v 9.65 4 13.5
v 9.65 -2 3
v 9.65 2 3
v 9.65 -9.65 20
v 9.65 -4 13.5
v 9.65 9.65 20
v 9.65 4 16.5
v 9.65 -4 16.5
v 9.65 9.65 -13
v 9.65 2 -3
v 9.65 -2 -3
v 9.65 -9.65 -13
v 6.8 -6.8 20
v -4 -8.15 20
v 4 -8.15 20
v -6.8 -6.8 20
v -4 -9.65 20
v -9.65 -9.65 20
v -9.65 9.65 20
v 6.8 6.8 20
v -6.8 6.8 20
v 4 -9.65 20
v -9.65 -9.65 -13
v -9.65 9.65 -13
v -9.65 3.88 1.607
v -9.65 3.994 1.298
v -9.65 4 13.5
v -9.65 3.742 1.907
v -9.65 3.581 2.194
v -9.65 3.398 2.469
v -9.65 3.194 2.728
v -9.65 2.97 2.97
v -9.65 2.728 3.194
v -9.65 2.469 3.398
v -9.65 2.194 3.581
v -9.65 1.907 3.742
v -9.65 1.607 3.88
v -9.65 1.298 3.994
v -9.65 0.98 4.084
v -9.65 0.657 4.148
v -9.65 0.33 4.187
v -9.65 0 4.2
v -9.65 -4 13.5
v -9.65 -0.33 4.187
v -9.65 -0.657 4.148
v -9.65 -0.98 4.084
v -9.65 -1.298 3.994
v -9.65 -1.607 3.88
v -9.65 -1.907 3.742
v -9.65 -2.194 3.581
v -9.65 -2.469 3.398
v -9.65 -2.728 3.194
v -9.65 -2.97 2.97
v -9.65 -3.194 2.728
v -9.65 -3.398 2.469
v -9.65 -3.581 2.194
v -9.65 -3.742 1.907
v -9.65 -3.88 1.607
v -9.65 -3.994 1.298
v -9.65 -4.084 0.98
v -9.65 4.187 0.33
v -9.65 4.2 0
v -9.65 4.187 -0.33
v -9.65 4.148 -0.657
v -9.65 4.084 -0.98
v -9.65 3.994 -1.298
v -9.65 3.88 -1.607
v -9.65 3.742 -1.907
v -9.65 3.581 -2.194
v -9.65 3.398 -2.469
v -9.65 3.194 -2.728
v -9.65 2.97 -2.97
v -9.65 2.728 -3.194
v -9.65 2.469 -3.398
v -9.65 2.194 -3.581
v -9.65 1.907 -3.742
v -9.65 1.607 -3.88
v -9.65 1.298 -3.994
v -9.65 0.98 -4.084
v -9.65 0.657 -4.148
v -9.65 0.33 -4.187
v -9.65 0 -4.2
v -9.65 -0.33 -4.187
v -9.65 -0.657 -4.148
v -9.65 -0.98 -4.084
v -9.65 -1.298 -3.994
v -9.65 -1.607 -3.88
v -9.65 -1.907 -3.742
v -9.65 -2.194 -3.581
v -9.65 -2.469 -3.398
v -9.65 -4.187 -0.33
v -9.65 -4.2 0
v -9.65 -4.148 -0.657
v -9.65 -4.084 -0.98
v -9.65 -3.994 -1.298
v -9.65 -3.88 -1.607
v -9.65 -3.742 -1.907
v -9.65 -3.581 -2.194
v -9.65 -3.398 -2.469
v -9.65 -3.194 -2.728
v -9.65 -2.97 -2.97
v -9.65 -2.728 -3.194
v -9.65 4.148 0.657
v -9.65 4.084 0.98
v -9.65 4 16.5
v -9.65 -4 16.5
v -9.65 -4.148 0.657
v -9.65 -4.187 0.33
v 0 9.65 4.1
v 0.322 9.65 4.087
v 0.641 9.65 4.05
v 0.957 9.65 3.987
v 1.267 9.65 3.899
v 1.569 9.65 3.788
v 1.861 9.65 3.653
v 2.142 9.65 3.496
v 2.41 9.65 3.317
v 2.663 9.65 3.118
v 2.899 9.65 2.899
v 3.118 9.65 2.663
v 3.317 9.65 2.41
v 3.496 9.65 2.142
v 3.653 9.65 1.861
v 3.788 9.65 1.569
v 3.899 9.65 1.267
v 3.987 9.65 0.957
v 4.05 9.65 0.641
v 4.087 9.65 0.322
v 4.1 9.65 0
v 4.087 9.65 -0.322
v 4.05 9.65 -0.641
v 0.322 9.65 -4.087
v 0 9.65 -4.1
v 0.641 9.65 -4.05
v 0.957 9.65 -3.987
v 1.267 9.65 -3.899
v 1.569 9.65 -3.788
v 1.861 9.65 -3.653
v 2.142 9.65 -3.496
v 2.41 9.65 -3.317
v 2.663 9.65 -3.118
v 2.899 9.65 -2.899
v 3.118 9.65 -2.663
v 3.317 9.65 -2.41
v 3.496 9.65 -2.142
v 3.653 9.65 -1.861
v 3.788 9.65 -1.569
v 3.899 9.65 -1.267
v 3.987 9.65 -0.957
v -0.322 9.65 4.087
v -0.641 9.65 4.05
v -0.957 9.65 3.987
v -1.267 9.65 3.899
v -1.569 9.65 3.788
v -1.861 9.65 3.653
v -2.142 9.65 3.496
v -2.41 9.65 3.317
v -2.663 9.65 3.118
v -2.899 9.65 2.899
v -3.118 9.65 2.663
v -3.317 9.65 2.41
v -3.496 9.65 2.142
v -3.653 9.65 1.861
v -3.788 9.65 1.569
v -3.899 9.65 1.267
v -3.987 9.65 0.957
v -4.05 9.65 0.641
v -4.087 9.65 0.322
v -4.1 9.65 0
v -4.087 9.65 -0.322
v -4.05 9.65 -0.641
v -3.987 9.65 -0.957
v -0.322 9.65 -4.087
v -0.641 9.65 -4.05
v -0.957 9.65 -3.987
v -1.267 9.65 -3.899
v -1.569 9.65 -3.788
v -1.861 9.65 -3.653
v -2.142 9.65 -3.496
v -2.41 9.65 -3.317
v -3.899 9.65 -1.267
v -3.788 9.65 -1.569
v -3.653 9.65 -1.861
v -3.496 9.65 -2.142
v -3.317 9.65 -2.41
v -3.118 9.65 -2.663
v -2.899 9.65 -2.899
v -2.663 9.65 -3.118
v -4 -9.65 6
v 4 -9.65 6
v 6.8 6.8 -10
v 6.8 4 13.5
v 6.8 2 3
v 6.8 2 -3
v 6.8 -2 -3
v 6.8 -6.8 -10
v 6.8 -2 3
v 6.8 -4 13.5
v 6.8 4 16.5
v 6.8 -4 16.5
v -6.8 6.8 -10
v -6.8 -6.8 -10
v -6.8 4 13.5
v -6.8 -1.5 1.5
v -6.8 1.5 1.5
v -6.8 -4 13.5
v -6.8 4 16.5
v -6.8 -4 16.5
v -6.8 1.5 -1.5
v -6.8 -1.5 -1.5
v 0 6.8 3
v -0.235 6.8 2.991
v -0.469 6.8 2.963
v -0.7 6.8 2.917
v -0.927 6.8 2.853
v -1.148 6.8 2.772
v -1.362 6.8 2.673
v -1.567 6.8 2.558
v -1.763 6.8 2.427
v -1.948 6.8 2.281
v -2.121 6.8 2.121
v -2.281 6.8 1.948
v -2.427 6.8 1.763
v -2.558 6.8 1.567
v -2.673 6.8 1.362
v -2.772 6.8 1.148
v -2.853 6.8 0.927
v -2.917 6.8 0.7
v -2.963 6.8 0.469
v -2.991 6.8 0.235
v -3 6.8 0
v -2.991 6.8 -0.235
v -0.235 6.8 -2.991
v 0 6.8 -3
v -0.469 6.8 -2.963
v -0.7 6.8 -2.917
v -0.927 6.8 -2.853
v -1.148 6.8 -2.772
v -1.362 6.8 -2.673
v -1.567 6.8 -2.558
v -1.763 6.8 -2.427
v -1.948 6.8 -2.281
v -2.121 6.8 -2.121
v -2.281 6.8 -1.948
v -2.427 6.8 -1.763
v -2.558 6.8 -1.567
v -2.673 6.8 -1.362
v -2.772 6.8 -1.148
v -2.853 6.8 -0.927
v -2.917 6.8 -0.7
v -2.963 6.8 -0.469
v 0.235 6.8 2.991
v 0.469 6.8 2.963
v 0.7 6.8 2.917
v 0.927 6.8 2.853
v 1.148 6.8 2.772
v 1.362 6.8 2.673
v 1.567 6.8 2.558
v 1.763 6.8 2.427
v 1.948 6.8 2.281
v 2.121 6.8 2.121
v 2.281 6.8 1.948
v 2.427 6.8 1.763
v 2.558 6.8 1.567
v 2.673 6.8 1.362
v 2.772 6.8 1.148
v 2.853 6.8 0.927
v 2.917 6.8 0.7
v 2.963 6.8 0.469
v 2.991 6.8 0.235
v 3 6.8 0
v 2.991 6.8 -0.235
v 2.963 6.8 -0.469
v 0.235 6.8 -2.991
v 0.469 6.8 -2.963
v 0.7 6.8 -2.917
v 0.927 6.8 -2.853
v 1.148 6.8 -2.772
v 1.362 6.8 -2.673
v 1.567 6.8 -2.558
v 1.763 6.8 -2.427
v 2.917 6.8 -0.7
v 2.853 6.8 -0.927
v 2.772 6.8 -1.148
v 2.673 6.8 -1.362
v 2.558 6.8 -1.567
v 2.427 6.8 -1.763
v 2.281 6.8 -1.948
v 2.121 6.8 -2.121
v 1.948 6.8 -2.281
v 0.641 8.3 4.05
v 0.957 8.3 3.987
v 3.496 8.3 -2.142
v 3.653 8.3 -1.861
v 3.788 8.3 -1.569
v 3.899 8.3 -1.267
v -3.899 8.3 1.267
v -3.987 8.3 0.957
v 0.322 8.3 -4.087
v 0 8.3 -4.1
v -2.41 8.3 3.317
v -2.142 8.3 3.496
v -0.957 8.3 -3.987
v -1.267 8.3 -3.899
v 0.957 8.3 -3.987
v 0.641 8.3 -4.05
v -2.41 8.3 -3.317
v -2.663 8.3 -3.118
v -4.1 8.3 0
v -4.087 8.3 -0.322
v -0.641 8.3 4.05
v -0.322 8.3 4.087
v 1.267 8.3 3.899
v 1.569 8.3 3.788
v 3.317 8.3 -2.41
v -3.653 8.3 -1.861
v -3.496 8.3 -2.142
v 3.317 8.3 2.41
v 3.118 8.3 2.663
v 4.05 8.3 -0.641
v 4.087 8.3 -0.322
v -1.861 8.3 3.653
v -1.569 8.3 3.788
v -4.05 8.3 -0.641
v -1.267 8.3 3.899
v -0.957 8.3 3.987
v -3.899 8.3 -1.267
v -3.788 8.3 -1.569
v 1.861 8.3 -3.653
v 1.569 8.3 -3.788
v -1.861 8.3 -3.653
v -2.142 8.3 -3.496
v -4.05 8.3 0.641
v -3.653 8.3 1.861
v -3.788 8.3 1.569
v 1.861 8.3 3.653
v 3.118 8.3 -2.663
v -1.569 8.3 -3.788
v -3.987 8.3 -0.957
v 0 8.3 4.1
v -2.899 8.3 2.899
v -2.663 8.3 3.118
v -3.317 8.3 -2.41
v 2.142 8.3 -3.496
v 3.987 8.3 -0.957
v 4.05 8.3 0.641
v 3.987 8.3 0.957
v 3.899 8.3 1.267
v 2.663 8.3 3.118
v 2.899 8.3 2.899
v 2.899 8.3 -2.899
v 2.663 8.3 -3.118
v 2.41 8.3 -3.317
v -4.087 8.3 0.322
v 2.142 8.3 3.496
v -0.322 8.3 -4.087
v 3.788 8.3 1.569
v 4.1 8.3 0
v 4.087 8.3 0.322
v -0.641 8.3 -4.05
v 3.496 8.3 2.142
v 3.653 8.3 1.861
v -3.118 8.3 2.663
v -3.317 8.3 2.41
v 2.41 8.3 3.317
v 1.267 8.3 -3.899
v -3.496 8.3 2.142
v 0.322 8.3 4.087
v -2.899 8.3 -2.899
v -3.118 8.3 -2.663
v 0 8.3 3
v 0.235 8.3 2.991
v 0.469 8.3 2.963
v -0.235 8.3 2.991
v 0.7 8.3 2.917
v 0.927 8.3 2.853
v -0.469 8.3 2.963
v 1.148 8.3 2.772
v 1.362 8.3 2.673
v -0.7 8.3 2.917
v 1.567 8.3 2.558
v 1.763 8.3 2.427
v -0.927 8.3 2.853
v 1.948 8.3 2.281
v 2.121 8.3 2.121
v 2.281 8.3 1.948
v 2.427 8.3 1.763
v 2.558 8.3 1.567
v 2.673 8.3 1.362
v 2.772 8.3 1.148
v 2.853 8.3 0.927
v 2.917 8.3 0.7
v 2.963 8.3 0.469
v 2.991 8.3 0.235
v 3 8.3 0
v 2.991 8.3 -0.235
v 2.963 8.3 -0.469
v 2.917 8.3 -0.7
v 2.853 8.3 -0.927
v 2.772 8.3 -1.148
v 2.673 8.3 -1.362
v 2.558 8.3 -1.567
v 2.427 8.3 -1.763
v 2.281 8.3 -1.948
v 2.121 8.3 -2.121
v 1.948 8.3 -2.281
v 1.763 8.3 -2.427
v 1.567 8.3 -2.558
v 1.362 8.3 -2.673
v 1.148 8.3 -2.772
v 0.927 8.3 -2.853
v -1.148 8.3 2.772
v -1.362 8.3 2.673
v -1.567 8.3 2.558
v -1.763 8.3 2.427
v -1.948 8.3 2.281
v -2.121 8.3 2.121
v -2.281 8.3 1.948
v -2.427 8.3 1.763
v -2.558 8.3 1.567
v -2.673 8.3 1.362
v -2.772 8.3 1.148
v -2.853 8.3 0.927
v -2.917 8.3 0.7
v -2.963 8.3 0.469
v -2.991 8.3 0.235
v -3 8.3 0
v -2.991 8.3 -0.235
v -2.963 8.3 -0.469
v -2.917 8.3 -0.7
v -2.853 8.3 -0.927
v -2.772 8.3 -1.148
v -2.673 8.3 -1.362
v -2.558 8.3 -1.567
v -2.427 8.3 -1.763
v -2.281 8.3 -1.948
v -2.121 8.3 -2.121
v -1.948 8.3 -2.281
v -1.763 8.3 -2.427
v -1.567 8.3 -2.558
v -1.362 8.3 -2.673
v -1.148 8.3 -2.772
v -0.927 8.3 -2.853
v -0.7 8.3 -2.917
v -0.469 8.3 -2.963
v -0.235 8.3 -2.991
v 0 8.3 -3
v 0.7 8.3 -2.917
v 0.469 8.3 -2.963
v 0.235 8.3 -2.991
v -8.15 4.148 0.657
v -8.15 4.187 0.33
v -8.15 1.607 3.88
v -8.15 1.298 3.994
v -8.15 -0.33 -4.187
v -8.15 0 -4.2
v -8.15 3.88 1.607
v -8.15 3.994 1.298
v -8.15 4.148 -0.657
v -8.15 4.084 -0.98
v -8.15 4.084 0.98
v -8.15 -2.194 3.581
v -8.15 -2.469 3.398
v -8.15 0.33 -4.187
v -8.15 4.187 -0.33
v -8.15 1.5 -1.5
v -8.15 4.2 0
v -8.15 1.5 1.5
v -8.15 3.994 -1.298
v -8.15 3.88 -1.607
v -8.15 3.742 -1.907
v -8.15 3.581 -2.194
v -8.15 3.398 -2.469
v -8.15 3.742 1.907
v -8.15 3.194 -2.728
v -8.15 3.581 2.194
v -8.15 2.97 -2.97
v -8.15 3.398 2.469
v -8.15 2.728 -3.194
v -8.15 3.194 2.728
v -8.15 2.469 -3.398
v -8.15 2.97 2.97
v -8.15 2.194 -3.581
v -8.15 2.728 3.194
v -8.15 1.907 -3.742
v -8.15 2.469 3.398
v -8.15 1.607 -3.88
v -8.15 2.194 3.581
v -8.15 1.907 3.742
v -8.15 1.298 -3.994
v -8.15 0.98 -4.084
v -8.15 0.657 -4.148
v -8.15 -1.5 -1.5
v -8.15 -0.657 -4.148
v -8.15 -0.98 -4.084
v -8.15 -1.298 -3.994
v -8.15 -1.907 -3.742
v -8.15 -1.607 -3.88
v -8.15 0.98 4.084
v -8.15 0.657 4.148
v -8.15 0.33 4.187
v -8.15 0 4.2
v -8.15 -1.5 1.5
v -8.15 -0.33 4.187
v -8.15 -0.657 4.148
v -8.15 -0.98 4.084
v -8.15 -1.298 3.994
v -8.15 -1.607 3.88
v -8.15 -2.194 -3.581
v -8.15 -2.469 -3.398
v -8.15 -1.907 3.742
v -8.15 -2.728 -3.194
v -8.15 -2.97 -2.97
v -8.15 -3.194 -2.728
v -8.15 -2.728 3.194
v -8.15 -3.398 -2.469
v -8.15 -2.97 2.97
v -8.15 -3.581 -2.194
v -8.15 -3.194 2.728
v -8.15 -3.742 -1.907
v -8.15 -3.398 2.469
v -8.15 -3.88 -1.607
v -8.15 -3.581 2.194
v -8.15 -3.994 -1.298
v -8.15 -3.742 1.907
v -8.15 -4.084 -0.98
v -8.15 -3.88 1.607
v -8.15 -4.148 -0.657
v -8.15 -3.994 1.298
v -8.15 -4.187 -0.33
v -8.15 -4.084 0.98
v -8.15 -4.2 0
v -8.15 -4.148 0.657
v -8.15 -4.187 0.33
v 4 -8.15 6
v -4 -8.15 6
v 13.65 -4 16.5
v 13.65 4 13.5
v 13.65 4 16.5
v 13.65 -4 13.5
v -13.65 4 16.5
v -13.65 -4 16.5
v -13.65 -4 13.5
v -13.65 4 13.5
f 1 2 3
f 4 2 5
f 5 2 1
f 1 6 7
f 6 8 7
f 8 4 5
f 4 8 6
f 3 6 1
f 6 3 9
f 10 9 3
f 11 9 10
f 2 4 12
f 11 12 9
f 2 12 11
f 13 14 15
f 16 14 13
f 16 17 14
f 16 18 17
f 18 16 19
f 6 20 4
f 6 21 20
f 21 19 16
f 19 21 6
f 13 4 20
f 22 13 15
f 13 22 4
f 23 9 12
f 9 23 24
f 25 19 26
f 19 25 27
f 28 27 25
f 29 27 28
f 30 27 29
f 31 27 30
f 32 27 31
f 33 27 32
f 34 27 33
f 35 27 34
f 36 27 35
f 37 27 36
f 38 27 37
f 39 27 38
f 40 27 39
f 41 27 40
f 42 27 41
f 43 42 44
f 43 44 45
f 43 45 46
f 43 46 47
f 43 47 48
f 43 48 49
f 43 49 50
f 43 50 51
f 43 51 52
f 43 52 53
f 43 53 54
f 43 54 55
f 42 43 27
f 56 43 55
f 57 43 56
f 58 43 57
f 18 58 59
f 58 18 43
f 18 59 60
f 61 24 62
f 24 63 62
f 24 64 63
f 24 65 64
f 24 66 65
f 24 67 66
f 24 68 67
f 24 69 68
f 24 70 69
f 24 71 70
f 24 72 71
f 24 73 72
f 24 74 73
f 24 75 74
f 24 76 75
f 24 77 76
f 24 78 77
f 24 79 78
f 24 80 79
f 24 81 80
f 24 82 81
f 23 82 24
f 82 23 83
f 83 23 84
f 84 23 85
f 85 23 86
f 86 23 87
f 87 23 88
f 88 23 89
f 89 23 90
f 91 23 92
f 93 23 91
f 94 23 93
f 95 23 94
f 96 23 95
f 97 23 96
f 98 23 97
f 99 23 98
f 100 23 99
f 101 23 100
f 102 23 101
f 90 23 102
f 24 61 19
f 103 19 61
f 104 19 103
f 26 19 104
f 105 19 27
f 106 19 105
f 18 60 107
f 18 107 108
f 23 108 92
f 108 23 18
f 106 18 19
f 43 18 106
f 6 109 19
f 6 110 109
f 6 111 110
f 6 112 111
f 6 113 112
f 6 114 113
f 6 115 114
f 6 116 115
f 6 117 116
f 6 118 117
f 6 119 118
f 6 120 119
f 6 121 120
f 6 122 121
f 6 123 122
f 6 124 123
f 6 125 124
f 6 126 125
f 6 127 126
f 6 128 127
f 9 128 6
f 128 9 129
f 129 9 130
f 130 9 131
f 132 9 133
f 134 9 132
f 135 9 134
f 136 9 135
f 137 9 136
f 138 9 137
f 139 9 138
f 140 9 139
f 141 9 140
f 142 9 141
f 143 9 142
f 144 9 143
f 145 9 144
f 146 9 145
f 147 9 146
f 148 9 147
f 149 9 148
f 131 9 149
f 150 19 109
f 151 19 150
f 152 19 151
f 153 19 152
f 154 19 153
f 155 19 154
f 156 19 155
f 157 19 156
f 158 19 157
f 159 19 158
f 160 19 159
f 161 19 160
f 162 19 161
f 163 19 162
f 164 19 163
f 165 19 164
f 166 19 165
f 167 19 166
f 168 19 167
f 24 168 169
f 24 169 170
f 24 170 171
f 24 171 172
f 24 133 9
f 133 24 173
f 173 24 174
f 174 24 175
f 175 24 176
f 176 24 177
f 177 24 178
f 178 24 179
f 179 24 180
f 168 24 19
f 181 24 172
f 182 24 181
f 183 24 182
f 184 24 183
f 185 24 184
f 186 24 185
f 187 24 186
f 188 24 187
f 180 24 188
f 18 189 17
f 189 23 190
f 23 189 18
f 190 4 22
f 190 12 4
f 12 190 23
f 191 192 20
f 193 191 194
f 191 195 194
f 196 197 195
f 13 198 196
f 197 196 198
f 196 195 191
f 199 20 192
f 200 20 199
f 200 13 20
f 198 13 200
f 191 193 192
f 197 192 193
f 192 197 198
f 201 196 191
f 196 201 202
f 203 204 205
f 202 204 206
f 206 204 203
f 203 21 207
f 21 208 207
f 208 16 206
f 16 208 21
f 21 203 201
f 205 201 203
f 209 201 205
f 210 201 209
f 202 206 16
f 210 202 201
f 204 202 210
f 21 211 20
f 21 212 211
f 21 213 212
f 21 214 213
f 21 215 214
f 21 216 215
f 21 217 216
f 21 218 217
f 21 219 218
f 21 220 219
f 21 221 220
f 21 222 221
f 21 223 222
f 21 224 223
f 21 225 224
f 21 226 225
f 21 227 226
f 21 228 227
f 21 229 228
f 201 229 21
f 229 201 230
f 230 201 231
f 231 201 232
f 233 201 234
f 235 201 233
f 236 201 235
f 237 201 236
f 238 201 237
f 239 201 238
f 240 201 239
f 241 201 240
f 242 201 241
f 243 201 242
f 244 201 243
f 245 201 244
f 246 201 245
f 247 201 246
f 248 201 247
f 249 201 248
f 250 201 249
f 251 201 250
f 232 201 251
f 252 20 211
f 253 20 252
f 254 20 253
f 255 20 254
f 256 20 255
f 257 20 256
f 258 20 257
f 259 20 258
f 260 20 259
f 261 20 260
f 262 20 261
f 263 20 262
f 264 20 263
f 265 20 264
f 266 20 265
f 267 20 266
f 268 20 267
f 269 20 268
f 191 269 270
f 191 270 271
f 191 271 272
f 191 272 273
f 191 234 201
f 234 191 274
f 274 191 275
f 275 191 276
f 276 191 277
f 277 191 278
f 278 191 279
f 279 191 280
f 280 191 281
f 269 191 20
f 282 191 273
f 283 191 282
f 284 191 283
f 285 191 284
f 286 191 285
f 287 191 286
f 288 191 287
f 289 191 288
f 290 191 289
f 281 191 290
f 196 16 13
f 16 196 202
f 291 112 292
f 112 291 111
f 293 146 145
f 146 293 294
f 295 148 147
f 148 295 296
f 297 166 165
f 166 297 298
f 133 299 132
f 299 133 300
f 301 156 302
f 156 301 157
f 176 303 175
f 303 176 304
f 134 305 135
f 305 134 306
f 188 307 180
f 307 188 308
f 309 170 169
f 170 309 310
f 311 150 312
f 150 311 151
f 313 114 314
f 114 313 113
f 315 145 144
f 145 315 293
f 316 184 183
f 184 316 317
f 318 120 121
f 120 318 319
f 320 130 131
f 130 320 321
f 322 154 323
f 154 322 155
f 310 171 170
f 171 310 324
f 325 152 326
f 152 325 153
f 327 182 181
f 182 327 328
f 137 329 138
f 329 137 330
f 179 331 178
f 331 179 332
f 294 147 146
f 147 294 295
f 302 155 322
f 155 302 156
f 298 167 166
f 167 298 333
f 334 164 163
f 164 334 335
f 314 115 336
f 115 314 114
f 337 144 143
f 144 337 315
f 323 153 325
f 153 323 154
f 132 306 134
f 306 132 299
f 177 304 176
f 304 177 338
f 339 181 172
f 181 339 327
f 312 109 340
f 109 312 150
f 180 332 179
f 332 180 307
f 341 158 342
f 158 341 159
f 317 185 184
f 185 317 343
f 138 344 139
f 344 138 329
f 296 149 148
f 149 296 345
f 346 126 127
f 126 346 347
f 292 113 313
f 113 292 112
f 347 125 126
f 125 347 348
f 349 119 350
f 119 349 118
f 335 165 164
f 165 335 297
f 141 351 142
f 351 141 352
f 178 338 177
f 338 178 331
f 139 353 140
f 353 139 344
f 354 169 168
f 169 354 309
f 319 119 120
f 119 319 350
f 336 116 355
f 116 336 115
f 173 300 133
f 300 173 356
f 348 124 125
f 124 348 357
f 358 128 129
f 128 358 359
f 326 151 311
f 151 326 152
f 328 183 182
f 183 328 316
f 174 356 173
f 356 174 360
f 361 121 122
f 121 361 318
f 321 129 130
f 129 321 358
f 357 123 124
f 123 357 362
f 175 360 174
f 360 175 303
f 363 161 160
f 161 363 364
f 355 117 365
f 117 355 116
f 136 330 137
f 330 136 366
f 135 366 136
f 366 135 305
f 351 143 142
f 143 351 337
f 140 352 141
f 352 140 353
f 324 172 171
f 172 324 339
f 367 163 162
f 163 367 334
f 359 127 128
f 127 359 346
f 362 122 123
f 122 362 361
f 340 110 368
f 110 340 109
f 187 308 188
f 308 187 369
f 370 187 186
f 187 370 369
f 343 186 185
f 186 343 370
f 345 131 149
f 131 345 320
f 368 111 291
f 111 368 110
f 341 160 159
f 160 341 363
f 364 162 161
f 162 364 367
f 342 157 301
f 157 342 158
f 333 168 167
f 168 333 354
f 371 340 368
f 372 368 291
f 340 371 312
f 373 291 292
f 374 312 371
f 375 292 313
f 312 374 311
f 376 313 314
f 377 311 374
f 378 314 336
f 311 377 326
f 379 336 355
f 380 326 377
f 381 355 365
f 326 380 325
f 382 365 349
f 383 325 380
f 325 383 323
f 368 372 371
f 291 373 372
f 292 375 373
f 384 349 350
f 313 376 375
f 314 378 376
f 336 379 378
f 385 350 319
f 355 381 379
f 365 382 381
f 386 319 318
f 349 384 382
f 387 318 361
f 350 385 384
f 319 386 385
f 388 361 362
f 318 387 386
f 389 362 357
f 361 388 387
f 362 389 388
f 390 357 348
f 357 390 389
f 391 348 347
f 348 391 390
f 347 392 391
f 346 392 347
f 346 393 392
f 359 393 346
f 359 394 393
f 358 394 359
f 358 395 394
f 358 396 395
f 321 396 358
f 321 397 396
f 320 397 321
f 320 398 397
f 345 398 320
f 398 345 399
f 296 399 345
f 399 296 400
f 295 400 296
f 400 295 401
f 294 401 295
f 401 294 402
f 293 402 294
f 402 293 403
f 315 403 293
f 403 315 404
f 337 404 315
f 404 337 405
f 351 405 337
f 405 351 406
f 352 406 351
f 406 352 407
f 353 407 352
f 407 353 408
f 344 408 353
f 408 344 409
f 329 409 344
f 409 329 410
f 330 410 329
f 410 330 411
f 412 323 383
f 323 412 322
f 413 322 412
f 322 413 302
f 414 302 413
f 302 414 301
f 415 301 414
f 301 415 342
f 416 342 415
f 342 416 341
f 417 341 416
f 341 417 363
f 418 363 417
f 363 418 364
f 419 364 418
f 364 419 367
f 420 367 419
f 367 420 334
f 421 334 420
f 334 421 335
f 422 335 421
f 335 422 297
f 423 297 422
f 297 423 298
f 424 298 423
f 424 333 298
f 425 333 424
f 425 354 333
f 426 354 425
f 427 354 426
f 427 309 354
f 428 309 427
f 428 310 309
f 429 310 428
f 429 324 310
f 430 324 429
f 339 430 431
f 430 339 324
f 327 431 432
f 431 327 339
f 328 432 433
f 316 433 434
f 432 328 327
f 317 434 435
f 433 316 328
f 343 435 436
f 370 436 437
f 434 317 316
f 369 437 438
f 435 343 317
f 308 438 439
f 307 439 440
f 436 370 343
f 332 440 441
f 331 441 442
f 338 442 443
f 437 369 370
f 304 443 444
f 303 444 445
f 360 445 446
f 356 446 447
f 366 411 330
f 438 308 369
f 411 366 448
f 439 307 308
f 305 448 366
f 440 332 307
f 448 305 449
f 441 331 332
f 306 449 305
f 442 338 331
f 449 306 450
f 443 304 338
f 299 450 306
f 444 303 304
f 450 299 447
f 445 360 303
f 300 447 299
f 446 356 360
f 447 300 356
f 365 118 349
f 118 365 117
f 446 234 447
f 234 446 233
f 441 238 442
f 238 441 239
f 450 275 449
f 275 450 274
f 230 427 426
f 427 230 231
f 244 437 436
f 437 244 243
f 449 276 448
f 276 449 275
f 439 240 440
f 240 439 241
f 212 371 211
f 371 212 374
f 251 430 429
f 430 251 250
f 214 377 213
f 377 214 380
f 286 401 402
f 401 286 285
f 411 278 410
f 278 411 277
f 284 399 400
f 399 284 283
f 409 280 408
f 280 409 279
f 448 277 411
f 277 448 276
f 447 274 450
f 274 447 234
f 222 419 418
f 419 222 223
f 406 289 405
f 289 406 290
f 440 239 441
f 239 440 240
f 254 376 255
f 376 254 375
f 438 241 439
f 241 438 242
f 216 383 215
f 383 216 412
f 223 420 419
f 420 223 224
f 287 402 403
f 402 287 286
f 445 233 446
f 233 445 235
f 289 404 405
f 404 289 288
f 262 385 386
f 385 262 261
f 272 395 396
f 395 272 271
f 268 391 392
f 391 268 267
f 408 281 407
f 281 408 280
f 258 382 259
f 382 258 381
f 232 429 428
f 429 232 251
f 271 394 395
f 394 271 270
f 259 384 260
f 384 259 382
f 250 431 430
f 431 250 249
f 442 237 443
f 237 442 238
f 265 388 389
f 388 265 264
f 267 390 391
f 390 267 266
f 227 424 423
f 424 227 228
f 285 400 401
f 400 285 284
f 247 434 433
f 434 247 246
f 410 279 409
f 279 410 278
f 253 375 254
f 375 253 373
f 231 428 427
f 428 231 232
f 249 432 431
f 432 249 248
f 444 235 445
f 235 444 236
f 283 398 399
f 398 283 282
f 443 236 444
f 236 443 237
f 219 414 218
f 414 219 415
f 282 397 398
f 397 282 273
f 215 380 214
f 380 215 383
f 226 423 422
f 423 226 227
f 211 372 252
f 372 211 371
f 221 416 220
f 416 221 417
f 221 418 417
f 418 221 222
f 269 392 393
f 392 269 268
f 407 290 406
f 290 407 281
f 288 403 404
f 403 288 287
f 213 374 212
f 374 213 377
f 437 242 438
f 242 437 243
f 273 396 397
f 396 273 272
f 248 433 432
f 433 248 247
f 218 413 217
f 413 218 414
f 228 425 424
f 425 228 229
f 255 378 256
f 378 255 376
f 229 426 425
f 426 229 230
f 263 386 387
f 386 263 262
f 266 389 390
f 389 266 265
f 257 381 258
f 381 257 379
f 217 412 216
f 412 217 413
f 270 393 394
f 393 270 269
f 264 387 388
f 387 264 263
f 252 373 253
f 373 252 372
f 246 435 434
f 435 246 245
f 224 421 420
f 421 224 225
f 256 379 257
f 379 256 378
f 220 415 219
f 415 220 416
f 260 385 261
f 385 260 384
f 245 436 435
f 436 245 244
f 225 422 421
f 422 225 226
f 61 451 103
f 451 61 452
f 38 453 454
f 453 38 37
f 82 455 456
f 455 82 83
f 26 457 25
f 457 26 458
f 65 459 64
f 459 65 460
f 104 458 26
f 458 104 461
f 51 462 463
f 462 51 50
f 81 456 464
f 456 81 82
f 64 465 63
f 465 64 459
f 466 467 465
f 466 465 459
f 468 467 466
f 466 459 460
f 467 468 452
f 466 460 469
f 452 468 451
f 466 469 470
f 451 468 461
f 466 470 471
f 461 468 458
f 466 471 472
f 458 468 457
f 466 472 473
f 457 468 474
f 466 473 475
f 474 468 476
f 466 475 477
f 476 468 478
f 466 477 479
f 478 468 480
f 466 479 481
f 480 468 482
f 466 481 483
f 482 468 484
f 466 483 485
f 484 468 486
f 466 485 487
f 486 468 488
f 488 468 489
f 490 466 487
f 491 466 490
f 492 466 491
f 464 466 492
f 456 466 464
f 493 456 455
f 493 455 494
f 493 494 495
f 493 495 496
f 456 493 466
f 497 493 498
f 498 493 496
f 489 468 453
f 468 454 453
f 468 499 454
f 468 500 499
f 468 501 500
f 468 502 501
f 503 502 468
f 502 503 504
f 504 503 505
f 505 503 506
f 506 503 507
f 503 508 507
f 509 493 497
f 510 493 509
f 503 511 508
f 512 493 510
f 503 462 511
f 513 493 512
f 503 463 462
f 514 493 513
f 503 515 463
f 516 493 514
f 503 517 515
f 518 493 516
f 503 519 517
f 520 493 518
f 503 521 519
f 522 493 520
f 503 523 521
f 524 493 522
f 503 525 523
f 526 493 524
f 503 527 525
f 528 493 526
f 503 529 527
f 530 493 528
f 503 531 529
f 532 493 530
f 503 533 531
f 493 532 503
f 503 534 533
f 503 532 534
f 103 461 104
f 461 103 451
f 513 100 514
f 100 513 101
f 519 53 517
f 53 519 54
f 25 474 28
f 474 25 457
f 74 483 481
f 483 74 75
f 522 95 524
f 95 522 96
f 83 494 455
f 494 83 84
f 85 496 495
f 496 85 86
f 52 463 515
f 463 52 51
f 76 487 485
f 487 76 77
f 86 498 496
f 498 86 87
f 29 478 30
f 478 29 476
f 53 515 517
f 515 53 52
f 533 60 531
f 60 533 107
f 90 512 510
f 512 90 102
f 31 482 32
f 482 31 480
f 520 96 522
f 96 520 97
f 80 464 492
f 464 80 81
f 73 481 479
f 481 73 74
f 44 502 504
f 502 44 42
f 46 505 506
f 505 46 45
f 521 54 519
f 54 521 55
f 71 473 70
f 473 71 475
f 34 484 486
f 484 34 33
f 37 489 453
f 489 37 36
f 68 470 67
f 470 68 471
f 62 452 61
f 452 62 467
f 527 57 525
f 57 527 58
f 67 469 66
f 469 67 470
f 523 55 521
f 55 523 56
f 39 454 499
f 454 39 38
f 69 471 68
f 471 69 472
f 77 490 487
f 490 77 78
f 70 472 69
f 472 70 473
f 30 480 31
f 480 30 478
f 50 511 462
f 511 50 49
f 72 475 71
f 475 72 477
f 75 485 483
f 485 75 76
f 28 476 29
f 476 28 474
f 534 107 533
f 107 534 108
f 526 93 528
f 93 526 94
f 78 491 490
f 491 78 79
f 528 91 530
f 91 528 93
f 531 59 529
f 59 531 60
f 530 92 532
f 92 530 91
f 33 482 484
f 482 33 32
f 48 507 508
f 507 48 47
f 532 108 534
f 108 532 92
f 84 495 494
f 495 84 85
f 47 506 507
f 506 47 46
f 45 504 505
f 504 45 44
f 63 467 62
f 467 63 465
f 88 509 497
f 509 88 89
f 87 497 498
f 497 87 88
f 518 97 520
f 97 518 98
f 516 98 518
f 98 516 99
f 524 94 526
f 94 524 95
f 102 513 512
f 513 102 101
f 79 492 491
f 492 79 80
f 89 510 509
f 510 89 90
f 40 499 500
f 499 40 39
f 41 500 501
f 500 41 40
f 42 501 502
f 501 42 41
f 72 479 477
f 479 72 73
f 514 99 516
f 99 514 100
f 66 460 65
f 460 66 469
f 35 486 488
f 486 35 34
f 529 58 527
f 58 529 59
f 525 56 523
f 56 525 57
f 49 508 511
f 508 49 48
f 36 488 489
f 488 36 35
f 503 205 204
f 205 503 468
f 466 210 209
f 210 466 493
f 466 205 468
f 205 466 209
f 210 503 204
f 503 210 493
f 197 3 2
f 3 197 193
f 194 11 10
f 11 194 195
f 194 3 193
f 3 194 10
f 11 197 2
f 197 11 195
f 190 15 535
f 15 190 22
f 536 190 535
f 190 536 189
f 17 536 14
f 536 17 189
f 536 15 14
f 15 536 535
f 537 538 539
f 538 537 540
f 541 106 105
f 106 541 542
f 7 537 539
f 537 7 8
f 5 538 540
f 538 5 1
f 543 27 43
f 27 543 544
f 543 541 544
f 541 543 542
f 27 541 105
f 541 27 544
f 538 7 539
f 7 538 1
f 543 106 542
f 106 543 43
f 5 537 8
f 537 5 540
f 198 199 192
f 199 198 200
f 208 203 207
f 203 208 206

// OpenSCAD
$vpd=100;
$fn=80;

T = 3; //wall thickness in mm
depth_coil=5;

coil_w = 10;
coil_h = 5;
coil_r = 21;
coil_r1 = 22+9-depth_coil;
coil_r2 = 8;
hole_r = 0;
coil_spacing = 23.1;
//coil_spacing = 72;

play = 0.2;
play_cuvette = 0.3;

Wcuv = 13.3; //cuvette width
Hcuv = 30; //cuvette holder height

//translate([-50,0,0]) rotate([180,0,0]) rotate([0,-90,0]) coil_holder();
//translate([0,80,0]) rotate([0,90,-90]) cam_tube_holder();

 
difference(){
    union(){
        
        translate([0,0,-10-T]) cuvette_tube();              
    }
//    
    
}


module cuvette_tube (  ) {

    difference(){

        //Basic tube
        translate([-Wcuv/2-T, -Wcuv/2-T, 0])
        difference(){
            cube([Wcuv+2*T, Wcuv+2*T, Hcuv+T], center=false);
            translate([T-play_cuvette/2, T-play_cuvette/2, T]) cube([Wcuv+play_cuvette, Wcuv+play_cuvette, Hcuv+1], center=false);
        }

        //Includes slits
        slit_H = 10;                    //height of slits (w.r.t. cuvette)
        slit2_H = 3;                 //secondary slit height
        slit2_W = 3;                    //secondary slit width
        slit2_dist = 3;                 //secondary slit spacing
        slit3_W=4;                      //third slit width
        slit3_H=4;                      //third slit height
        slit1_H = 6;                    //primary slit height
        slit1_W = 4;                    //primary slit width
        radius_photo=4.1;               //radius of photodiode
         radius_photo2=3;               //radius of photodiode
        radius_photo3=4.2;               //radius of photodiode
        slit_diff=slit2_H-slit1_H;
        translate([0, 0, slit_H+T])
        union(){
            //Primary slit
            translate([Wcuv/2+T/2, 0 ,0]) 
            cube([T+1, slit1_W, slit1_H], center=true);

            //Scatter slit holder
            union(){
                translate([0, (Wcuv/2+1.55*T) ,0]) 
            rotate([90,90,0])
            cylinder(h=2*T, r1=radius_photo, r2=radius_photo, center=true);
            //cube([T+1, slit1_W, slit1_H], center=true);
             //Scatter slit
            translate([0, (Wcuv/2+1.5*T) ,0]) 
            rotate([90,90,0])
            cylinder(h=4*T, r1=radius_photo2, r2=radius_photo2, center=true);
            //cube([T+1, slit1_W, slit1_H], center=true);
            }
                //Delete hall sensor
            sensor_h = 30;
            sensor_l = 8;
            sensor_w = 8;
            translate([0,-Wcuv/2-T/2-0.5*sensor_l,0.7*sensor_h]) 
            cube([sensor_w, sensor_l, sensor_h], center=true);
            

            //secondary slit
            union(){
            translate([-Wcuv/2-1.5*T,0, 0]) 
            rotate([0,90,0])
            cylinder(h=2*T, r1=radius_photo3, r2=radius_photo3, center=true);
         
            translate([-Wcuv/2-T/2,0, slit1_H/2+slit_diff/2])
            translate([0, 0, -slit2_dist/2])   cube([T+1, slit2_W, slit2_H], center=true);

        }       
        }
    }
    
    //Add 'wings'
    wing_h = 28;
    wing_l = 4;
    wing_w = 8;
    translate([0,0,wing_h]) 
    difference(){
        cube([Wcuv+2*T+2*wing_l, wing_w, T], center=true);
        cube([Wcuv+play_cuvette, Wcuv+play_cuvette, T], center=true);
    }
}

module cuvette_cube (  ) {

    translate([-Wcuv/2-T-play/2, -Wcuv/2-T-play/2, 0])
    cube([Wcuv+2*T+play, Wcuv+2*T+play, Hcuv+T], center=false);
    
    //Add 'wings'
    wing_h = 28;
    wing_l = 4;
    wing_w = 8;
    translate([0,0,wing_h]) 
    cube([Wcuv+2*T+2*wing_l+play, wing_w+play, 2*T], center=true);
    


}
